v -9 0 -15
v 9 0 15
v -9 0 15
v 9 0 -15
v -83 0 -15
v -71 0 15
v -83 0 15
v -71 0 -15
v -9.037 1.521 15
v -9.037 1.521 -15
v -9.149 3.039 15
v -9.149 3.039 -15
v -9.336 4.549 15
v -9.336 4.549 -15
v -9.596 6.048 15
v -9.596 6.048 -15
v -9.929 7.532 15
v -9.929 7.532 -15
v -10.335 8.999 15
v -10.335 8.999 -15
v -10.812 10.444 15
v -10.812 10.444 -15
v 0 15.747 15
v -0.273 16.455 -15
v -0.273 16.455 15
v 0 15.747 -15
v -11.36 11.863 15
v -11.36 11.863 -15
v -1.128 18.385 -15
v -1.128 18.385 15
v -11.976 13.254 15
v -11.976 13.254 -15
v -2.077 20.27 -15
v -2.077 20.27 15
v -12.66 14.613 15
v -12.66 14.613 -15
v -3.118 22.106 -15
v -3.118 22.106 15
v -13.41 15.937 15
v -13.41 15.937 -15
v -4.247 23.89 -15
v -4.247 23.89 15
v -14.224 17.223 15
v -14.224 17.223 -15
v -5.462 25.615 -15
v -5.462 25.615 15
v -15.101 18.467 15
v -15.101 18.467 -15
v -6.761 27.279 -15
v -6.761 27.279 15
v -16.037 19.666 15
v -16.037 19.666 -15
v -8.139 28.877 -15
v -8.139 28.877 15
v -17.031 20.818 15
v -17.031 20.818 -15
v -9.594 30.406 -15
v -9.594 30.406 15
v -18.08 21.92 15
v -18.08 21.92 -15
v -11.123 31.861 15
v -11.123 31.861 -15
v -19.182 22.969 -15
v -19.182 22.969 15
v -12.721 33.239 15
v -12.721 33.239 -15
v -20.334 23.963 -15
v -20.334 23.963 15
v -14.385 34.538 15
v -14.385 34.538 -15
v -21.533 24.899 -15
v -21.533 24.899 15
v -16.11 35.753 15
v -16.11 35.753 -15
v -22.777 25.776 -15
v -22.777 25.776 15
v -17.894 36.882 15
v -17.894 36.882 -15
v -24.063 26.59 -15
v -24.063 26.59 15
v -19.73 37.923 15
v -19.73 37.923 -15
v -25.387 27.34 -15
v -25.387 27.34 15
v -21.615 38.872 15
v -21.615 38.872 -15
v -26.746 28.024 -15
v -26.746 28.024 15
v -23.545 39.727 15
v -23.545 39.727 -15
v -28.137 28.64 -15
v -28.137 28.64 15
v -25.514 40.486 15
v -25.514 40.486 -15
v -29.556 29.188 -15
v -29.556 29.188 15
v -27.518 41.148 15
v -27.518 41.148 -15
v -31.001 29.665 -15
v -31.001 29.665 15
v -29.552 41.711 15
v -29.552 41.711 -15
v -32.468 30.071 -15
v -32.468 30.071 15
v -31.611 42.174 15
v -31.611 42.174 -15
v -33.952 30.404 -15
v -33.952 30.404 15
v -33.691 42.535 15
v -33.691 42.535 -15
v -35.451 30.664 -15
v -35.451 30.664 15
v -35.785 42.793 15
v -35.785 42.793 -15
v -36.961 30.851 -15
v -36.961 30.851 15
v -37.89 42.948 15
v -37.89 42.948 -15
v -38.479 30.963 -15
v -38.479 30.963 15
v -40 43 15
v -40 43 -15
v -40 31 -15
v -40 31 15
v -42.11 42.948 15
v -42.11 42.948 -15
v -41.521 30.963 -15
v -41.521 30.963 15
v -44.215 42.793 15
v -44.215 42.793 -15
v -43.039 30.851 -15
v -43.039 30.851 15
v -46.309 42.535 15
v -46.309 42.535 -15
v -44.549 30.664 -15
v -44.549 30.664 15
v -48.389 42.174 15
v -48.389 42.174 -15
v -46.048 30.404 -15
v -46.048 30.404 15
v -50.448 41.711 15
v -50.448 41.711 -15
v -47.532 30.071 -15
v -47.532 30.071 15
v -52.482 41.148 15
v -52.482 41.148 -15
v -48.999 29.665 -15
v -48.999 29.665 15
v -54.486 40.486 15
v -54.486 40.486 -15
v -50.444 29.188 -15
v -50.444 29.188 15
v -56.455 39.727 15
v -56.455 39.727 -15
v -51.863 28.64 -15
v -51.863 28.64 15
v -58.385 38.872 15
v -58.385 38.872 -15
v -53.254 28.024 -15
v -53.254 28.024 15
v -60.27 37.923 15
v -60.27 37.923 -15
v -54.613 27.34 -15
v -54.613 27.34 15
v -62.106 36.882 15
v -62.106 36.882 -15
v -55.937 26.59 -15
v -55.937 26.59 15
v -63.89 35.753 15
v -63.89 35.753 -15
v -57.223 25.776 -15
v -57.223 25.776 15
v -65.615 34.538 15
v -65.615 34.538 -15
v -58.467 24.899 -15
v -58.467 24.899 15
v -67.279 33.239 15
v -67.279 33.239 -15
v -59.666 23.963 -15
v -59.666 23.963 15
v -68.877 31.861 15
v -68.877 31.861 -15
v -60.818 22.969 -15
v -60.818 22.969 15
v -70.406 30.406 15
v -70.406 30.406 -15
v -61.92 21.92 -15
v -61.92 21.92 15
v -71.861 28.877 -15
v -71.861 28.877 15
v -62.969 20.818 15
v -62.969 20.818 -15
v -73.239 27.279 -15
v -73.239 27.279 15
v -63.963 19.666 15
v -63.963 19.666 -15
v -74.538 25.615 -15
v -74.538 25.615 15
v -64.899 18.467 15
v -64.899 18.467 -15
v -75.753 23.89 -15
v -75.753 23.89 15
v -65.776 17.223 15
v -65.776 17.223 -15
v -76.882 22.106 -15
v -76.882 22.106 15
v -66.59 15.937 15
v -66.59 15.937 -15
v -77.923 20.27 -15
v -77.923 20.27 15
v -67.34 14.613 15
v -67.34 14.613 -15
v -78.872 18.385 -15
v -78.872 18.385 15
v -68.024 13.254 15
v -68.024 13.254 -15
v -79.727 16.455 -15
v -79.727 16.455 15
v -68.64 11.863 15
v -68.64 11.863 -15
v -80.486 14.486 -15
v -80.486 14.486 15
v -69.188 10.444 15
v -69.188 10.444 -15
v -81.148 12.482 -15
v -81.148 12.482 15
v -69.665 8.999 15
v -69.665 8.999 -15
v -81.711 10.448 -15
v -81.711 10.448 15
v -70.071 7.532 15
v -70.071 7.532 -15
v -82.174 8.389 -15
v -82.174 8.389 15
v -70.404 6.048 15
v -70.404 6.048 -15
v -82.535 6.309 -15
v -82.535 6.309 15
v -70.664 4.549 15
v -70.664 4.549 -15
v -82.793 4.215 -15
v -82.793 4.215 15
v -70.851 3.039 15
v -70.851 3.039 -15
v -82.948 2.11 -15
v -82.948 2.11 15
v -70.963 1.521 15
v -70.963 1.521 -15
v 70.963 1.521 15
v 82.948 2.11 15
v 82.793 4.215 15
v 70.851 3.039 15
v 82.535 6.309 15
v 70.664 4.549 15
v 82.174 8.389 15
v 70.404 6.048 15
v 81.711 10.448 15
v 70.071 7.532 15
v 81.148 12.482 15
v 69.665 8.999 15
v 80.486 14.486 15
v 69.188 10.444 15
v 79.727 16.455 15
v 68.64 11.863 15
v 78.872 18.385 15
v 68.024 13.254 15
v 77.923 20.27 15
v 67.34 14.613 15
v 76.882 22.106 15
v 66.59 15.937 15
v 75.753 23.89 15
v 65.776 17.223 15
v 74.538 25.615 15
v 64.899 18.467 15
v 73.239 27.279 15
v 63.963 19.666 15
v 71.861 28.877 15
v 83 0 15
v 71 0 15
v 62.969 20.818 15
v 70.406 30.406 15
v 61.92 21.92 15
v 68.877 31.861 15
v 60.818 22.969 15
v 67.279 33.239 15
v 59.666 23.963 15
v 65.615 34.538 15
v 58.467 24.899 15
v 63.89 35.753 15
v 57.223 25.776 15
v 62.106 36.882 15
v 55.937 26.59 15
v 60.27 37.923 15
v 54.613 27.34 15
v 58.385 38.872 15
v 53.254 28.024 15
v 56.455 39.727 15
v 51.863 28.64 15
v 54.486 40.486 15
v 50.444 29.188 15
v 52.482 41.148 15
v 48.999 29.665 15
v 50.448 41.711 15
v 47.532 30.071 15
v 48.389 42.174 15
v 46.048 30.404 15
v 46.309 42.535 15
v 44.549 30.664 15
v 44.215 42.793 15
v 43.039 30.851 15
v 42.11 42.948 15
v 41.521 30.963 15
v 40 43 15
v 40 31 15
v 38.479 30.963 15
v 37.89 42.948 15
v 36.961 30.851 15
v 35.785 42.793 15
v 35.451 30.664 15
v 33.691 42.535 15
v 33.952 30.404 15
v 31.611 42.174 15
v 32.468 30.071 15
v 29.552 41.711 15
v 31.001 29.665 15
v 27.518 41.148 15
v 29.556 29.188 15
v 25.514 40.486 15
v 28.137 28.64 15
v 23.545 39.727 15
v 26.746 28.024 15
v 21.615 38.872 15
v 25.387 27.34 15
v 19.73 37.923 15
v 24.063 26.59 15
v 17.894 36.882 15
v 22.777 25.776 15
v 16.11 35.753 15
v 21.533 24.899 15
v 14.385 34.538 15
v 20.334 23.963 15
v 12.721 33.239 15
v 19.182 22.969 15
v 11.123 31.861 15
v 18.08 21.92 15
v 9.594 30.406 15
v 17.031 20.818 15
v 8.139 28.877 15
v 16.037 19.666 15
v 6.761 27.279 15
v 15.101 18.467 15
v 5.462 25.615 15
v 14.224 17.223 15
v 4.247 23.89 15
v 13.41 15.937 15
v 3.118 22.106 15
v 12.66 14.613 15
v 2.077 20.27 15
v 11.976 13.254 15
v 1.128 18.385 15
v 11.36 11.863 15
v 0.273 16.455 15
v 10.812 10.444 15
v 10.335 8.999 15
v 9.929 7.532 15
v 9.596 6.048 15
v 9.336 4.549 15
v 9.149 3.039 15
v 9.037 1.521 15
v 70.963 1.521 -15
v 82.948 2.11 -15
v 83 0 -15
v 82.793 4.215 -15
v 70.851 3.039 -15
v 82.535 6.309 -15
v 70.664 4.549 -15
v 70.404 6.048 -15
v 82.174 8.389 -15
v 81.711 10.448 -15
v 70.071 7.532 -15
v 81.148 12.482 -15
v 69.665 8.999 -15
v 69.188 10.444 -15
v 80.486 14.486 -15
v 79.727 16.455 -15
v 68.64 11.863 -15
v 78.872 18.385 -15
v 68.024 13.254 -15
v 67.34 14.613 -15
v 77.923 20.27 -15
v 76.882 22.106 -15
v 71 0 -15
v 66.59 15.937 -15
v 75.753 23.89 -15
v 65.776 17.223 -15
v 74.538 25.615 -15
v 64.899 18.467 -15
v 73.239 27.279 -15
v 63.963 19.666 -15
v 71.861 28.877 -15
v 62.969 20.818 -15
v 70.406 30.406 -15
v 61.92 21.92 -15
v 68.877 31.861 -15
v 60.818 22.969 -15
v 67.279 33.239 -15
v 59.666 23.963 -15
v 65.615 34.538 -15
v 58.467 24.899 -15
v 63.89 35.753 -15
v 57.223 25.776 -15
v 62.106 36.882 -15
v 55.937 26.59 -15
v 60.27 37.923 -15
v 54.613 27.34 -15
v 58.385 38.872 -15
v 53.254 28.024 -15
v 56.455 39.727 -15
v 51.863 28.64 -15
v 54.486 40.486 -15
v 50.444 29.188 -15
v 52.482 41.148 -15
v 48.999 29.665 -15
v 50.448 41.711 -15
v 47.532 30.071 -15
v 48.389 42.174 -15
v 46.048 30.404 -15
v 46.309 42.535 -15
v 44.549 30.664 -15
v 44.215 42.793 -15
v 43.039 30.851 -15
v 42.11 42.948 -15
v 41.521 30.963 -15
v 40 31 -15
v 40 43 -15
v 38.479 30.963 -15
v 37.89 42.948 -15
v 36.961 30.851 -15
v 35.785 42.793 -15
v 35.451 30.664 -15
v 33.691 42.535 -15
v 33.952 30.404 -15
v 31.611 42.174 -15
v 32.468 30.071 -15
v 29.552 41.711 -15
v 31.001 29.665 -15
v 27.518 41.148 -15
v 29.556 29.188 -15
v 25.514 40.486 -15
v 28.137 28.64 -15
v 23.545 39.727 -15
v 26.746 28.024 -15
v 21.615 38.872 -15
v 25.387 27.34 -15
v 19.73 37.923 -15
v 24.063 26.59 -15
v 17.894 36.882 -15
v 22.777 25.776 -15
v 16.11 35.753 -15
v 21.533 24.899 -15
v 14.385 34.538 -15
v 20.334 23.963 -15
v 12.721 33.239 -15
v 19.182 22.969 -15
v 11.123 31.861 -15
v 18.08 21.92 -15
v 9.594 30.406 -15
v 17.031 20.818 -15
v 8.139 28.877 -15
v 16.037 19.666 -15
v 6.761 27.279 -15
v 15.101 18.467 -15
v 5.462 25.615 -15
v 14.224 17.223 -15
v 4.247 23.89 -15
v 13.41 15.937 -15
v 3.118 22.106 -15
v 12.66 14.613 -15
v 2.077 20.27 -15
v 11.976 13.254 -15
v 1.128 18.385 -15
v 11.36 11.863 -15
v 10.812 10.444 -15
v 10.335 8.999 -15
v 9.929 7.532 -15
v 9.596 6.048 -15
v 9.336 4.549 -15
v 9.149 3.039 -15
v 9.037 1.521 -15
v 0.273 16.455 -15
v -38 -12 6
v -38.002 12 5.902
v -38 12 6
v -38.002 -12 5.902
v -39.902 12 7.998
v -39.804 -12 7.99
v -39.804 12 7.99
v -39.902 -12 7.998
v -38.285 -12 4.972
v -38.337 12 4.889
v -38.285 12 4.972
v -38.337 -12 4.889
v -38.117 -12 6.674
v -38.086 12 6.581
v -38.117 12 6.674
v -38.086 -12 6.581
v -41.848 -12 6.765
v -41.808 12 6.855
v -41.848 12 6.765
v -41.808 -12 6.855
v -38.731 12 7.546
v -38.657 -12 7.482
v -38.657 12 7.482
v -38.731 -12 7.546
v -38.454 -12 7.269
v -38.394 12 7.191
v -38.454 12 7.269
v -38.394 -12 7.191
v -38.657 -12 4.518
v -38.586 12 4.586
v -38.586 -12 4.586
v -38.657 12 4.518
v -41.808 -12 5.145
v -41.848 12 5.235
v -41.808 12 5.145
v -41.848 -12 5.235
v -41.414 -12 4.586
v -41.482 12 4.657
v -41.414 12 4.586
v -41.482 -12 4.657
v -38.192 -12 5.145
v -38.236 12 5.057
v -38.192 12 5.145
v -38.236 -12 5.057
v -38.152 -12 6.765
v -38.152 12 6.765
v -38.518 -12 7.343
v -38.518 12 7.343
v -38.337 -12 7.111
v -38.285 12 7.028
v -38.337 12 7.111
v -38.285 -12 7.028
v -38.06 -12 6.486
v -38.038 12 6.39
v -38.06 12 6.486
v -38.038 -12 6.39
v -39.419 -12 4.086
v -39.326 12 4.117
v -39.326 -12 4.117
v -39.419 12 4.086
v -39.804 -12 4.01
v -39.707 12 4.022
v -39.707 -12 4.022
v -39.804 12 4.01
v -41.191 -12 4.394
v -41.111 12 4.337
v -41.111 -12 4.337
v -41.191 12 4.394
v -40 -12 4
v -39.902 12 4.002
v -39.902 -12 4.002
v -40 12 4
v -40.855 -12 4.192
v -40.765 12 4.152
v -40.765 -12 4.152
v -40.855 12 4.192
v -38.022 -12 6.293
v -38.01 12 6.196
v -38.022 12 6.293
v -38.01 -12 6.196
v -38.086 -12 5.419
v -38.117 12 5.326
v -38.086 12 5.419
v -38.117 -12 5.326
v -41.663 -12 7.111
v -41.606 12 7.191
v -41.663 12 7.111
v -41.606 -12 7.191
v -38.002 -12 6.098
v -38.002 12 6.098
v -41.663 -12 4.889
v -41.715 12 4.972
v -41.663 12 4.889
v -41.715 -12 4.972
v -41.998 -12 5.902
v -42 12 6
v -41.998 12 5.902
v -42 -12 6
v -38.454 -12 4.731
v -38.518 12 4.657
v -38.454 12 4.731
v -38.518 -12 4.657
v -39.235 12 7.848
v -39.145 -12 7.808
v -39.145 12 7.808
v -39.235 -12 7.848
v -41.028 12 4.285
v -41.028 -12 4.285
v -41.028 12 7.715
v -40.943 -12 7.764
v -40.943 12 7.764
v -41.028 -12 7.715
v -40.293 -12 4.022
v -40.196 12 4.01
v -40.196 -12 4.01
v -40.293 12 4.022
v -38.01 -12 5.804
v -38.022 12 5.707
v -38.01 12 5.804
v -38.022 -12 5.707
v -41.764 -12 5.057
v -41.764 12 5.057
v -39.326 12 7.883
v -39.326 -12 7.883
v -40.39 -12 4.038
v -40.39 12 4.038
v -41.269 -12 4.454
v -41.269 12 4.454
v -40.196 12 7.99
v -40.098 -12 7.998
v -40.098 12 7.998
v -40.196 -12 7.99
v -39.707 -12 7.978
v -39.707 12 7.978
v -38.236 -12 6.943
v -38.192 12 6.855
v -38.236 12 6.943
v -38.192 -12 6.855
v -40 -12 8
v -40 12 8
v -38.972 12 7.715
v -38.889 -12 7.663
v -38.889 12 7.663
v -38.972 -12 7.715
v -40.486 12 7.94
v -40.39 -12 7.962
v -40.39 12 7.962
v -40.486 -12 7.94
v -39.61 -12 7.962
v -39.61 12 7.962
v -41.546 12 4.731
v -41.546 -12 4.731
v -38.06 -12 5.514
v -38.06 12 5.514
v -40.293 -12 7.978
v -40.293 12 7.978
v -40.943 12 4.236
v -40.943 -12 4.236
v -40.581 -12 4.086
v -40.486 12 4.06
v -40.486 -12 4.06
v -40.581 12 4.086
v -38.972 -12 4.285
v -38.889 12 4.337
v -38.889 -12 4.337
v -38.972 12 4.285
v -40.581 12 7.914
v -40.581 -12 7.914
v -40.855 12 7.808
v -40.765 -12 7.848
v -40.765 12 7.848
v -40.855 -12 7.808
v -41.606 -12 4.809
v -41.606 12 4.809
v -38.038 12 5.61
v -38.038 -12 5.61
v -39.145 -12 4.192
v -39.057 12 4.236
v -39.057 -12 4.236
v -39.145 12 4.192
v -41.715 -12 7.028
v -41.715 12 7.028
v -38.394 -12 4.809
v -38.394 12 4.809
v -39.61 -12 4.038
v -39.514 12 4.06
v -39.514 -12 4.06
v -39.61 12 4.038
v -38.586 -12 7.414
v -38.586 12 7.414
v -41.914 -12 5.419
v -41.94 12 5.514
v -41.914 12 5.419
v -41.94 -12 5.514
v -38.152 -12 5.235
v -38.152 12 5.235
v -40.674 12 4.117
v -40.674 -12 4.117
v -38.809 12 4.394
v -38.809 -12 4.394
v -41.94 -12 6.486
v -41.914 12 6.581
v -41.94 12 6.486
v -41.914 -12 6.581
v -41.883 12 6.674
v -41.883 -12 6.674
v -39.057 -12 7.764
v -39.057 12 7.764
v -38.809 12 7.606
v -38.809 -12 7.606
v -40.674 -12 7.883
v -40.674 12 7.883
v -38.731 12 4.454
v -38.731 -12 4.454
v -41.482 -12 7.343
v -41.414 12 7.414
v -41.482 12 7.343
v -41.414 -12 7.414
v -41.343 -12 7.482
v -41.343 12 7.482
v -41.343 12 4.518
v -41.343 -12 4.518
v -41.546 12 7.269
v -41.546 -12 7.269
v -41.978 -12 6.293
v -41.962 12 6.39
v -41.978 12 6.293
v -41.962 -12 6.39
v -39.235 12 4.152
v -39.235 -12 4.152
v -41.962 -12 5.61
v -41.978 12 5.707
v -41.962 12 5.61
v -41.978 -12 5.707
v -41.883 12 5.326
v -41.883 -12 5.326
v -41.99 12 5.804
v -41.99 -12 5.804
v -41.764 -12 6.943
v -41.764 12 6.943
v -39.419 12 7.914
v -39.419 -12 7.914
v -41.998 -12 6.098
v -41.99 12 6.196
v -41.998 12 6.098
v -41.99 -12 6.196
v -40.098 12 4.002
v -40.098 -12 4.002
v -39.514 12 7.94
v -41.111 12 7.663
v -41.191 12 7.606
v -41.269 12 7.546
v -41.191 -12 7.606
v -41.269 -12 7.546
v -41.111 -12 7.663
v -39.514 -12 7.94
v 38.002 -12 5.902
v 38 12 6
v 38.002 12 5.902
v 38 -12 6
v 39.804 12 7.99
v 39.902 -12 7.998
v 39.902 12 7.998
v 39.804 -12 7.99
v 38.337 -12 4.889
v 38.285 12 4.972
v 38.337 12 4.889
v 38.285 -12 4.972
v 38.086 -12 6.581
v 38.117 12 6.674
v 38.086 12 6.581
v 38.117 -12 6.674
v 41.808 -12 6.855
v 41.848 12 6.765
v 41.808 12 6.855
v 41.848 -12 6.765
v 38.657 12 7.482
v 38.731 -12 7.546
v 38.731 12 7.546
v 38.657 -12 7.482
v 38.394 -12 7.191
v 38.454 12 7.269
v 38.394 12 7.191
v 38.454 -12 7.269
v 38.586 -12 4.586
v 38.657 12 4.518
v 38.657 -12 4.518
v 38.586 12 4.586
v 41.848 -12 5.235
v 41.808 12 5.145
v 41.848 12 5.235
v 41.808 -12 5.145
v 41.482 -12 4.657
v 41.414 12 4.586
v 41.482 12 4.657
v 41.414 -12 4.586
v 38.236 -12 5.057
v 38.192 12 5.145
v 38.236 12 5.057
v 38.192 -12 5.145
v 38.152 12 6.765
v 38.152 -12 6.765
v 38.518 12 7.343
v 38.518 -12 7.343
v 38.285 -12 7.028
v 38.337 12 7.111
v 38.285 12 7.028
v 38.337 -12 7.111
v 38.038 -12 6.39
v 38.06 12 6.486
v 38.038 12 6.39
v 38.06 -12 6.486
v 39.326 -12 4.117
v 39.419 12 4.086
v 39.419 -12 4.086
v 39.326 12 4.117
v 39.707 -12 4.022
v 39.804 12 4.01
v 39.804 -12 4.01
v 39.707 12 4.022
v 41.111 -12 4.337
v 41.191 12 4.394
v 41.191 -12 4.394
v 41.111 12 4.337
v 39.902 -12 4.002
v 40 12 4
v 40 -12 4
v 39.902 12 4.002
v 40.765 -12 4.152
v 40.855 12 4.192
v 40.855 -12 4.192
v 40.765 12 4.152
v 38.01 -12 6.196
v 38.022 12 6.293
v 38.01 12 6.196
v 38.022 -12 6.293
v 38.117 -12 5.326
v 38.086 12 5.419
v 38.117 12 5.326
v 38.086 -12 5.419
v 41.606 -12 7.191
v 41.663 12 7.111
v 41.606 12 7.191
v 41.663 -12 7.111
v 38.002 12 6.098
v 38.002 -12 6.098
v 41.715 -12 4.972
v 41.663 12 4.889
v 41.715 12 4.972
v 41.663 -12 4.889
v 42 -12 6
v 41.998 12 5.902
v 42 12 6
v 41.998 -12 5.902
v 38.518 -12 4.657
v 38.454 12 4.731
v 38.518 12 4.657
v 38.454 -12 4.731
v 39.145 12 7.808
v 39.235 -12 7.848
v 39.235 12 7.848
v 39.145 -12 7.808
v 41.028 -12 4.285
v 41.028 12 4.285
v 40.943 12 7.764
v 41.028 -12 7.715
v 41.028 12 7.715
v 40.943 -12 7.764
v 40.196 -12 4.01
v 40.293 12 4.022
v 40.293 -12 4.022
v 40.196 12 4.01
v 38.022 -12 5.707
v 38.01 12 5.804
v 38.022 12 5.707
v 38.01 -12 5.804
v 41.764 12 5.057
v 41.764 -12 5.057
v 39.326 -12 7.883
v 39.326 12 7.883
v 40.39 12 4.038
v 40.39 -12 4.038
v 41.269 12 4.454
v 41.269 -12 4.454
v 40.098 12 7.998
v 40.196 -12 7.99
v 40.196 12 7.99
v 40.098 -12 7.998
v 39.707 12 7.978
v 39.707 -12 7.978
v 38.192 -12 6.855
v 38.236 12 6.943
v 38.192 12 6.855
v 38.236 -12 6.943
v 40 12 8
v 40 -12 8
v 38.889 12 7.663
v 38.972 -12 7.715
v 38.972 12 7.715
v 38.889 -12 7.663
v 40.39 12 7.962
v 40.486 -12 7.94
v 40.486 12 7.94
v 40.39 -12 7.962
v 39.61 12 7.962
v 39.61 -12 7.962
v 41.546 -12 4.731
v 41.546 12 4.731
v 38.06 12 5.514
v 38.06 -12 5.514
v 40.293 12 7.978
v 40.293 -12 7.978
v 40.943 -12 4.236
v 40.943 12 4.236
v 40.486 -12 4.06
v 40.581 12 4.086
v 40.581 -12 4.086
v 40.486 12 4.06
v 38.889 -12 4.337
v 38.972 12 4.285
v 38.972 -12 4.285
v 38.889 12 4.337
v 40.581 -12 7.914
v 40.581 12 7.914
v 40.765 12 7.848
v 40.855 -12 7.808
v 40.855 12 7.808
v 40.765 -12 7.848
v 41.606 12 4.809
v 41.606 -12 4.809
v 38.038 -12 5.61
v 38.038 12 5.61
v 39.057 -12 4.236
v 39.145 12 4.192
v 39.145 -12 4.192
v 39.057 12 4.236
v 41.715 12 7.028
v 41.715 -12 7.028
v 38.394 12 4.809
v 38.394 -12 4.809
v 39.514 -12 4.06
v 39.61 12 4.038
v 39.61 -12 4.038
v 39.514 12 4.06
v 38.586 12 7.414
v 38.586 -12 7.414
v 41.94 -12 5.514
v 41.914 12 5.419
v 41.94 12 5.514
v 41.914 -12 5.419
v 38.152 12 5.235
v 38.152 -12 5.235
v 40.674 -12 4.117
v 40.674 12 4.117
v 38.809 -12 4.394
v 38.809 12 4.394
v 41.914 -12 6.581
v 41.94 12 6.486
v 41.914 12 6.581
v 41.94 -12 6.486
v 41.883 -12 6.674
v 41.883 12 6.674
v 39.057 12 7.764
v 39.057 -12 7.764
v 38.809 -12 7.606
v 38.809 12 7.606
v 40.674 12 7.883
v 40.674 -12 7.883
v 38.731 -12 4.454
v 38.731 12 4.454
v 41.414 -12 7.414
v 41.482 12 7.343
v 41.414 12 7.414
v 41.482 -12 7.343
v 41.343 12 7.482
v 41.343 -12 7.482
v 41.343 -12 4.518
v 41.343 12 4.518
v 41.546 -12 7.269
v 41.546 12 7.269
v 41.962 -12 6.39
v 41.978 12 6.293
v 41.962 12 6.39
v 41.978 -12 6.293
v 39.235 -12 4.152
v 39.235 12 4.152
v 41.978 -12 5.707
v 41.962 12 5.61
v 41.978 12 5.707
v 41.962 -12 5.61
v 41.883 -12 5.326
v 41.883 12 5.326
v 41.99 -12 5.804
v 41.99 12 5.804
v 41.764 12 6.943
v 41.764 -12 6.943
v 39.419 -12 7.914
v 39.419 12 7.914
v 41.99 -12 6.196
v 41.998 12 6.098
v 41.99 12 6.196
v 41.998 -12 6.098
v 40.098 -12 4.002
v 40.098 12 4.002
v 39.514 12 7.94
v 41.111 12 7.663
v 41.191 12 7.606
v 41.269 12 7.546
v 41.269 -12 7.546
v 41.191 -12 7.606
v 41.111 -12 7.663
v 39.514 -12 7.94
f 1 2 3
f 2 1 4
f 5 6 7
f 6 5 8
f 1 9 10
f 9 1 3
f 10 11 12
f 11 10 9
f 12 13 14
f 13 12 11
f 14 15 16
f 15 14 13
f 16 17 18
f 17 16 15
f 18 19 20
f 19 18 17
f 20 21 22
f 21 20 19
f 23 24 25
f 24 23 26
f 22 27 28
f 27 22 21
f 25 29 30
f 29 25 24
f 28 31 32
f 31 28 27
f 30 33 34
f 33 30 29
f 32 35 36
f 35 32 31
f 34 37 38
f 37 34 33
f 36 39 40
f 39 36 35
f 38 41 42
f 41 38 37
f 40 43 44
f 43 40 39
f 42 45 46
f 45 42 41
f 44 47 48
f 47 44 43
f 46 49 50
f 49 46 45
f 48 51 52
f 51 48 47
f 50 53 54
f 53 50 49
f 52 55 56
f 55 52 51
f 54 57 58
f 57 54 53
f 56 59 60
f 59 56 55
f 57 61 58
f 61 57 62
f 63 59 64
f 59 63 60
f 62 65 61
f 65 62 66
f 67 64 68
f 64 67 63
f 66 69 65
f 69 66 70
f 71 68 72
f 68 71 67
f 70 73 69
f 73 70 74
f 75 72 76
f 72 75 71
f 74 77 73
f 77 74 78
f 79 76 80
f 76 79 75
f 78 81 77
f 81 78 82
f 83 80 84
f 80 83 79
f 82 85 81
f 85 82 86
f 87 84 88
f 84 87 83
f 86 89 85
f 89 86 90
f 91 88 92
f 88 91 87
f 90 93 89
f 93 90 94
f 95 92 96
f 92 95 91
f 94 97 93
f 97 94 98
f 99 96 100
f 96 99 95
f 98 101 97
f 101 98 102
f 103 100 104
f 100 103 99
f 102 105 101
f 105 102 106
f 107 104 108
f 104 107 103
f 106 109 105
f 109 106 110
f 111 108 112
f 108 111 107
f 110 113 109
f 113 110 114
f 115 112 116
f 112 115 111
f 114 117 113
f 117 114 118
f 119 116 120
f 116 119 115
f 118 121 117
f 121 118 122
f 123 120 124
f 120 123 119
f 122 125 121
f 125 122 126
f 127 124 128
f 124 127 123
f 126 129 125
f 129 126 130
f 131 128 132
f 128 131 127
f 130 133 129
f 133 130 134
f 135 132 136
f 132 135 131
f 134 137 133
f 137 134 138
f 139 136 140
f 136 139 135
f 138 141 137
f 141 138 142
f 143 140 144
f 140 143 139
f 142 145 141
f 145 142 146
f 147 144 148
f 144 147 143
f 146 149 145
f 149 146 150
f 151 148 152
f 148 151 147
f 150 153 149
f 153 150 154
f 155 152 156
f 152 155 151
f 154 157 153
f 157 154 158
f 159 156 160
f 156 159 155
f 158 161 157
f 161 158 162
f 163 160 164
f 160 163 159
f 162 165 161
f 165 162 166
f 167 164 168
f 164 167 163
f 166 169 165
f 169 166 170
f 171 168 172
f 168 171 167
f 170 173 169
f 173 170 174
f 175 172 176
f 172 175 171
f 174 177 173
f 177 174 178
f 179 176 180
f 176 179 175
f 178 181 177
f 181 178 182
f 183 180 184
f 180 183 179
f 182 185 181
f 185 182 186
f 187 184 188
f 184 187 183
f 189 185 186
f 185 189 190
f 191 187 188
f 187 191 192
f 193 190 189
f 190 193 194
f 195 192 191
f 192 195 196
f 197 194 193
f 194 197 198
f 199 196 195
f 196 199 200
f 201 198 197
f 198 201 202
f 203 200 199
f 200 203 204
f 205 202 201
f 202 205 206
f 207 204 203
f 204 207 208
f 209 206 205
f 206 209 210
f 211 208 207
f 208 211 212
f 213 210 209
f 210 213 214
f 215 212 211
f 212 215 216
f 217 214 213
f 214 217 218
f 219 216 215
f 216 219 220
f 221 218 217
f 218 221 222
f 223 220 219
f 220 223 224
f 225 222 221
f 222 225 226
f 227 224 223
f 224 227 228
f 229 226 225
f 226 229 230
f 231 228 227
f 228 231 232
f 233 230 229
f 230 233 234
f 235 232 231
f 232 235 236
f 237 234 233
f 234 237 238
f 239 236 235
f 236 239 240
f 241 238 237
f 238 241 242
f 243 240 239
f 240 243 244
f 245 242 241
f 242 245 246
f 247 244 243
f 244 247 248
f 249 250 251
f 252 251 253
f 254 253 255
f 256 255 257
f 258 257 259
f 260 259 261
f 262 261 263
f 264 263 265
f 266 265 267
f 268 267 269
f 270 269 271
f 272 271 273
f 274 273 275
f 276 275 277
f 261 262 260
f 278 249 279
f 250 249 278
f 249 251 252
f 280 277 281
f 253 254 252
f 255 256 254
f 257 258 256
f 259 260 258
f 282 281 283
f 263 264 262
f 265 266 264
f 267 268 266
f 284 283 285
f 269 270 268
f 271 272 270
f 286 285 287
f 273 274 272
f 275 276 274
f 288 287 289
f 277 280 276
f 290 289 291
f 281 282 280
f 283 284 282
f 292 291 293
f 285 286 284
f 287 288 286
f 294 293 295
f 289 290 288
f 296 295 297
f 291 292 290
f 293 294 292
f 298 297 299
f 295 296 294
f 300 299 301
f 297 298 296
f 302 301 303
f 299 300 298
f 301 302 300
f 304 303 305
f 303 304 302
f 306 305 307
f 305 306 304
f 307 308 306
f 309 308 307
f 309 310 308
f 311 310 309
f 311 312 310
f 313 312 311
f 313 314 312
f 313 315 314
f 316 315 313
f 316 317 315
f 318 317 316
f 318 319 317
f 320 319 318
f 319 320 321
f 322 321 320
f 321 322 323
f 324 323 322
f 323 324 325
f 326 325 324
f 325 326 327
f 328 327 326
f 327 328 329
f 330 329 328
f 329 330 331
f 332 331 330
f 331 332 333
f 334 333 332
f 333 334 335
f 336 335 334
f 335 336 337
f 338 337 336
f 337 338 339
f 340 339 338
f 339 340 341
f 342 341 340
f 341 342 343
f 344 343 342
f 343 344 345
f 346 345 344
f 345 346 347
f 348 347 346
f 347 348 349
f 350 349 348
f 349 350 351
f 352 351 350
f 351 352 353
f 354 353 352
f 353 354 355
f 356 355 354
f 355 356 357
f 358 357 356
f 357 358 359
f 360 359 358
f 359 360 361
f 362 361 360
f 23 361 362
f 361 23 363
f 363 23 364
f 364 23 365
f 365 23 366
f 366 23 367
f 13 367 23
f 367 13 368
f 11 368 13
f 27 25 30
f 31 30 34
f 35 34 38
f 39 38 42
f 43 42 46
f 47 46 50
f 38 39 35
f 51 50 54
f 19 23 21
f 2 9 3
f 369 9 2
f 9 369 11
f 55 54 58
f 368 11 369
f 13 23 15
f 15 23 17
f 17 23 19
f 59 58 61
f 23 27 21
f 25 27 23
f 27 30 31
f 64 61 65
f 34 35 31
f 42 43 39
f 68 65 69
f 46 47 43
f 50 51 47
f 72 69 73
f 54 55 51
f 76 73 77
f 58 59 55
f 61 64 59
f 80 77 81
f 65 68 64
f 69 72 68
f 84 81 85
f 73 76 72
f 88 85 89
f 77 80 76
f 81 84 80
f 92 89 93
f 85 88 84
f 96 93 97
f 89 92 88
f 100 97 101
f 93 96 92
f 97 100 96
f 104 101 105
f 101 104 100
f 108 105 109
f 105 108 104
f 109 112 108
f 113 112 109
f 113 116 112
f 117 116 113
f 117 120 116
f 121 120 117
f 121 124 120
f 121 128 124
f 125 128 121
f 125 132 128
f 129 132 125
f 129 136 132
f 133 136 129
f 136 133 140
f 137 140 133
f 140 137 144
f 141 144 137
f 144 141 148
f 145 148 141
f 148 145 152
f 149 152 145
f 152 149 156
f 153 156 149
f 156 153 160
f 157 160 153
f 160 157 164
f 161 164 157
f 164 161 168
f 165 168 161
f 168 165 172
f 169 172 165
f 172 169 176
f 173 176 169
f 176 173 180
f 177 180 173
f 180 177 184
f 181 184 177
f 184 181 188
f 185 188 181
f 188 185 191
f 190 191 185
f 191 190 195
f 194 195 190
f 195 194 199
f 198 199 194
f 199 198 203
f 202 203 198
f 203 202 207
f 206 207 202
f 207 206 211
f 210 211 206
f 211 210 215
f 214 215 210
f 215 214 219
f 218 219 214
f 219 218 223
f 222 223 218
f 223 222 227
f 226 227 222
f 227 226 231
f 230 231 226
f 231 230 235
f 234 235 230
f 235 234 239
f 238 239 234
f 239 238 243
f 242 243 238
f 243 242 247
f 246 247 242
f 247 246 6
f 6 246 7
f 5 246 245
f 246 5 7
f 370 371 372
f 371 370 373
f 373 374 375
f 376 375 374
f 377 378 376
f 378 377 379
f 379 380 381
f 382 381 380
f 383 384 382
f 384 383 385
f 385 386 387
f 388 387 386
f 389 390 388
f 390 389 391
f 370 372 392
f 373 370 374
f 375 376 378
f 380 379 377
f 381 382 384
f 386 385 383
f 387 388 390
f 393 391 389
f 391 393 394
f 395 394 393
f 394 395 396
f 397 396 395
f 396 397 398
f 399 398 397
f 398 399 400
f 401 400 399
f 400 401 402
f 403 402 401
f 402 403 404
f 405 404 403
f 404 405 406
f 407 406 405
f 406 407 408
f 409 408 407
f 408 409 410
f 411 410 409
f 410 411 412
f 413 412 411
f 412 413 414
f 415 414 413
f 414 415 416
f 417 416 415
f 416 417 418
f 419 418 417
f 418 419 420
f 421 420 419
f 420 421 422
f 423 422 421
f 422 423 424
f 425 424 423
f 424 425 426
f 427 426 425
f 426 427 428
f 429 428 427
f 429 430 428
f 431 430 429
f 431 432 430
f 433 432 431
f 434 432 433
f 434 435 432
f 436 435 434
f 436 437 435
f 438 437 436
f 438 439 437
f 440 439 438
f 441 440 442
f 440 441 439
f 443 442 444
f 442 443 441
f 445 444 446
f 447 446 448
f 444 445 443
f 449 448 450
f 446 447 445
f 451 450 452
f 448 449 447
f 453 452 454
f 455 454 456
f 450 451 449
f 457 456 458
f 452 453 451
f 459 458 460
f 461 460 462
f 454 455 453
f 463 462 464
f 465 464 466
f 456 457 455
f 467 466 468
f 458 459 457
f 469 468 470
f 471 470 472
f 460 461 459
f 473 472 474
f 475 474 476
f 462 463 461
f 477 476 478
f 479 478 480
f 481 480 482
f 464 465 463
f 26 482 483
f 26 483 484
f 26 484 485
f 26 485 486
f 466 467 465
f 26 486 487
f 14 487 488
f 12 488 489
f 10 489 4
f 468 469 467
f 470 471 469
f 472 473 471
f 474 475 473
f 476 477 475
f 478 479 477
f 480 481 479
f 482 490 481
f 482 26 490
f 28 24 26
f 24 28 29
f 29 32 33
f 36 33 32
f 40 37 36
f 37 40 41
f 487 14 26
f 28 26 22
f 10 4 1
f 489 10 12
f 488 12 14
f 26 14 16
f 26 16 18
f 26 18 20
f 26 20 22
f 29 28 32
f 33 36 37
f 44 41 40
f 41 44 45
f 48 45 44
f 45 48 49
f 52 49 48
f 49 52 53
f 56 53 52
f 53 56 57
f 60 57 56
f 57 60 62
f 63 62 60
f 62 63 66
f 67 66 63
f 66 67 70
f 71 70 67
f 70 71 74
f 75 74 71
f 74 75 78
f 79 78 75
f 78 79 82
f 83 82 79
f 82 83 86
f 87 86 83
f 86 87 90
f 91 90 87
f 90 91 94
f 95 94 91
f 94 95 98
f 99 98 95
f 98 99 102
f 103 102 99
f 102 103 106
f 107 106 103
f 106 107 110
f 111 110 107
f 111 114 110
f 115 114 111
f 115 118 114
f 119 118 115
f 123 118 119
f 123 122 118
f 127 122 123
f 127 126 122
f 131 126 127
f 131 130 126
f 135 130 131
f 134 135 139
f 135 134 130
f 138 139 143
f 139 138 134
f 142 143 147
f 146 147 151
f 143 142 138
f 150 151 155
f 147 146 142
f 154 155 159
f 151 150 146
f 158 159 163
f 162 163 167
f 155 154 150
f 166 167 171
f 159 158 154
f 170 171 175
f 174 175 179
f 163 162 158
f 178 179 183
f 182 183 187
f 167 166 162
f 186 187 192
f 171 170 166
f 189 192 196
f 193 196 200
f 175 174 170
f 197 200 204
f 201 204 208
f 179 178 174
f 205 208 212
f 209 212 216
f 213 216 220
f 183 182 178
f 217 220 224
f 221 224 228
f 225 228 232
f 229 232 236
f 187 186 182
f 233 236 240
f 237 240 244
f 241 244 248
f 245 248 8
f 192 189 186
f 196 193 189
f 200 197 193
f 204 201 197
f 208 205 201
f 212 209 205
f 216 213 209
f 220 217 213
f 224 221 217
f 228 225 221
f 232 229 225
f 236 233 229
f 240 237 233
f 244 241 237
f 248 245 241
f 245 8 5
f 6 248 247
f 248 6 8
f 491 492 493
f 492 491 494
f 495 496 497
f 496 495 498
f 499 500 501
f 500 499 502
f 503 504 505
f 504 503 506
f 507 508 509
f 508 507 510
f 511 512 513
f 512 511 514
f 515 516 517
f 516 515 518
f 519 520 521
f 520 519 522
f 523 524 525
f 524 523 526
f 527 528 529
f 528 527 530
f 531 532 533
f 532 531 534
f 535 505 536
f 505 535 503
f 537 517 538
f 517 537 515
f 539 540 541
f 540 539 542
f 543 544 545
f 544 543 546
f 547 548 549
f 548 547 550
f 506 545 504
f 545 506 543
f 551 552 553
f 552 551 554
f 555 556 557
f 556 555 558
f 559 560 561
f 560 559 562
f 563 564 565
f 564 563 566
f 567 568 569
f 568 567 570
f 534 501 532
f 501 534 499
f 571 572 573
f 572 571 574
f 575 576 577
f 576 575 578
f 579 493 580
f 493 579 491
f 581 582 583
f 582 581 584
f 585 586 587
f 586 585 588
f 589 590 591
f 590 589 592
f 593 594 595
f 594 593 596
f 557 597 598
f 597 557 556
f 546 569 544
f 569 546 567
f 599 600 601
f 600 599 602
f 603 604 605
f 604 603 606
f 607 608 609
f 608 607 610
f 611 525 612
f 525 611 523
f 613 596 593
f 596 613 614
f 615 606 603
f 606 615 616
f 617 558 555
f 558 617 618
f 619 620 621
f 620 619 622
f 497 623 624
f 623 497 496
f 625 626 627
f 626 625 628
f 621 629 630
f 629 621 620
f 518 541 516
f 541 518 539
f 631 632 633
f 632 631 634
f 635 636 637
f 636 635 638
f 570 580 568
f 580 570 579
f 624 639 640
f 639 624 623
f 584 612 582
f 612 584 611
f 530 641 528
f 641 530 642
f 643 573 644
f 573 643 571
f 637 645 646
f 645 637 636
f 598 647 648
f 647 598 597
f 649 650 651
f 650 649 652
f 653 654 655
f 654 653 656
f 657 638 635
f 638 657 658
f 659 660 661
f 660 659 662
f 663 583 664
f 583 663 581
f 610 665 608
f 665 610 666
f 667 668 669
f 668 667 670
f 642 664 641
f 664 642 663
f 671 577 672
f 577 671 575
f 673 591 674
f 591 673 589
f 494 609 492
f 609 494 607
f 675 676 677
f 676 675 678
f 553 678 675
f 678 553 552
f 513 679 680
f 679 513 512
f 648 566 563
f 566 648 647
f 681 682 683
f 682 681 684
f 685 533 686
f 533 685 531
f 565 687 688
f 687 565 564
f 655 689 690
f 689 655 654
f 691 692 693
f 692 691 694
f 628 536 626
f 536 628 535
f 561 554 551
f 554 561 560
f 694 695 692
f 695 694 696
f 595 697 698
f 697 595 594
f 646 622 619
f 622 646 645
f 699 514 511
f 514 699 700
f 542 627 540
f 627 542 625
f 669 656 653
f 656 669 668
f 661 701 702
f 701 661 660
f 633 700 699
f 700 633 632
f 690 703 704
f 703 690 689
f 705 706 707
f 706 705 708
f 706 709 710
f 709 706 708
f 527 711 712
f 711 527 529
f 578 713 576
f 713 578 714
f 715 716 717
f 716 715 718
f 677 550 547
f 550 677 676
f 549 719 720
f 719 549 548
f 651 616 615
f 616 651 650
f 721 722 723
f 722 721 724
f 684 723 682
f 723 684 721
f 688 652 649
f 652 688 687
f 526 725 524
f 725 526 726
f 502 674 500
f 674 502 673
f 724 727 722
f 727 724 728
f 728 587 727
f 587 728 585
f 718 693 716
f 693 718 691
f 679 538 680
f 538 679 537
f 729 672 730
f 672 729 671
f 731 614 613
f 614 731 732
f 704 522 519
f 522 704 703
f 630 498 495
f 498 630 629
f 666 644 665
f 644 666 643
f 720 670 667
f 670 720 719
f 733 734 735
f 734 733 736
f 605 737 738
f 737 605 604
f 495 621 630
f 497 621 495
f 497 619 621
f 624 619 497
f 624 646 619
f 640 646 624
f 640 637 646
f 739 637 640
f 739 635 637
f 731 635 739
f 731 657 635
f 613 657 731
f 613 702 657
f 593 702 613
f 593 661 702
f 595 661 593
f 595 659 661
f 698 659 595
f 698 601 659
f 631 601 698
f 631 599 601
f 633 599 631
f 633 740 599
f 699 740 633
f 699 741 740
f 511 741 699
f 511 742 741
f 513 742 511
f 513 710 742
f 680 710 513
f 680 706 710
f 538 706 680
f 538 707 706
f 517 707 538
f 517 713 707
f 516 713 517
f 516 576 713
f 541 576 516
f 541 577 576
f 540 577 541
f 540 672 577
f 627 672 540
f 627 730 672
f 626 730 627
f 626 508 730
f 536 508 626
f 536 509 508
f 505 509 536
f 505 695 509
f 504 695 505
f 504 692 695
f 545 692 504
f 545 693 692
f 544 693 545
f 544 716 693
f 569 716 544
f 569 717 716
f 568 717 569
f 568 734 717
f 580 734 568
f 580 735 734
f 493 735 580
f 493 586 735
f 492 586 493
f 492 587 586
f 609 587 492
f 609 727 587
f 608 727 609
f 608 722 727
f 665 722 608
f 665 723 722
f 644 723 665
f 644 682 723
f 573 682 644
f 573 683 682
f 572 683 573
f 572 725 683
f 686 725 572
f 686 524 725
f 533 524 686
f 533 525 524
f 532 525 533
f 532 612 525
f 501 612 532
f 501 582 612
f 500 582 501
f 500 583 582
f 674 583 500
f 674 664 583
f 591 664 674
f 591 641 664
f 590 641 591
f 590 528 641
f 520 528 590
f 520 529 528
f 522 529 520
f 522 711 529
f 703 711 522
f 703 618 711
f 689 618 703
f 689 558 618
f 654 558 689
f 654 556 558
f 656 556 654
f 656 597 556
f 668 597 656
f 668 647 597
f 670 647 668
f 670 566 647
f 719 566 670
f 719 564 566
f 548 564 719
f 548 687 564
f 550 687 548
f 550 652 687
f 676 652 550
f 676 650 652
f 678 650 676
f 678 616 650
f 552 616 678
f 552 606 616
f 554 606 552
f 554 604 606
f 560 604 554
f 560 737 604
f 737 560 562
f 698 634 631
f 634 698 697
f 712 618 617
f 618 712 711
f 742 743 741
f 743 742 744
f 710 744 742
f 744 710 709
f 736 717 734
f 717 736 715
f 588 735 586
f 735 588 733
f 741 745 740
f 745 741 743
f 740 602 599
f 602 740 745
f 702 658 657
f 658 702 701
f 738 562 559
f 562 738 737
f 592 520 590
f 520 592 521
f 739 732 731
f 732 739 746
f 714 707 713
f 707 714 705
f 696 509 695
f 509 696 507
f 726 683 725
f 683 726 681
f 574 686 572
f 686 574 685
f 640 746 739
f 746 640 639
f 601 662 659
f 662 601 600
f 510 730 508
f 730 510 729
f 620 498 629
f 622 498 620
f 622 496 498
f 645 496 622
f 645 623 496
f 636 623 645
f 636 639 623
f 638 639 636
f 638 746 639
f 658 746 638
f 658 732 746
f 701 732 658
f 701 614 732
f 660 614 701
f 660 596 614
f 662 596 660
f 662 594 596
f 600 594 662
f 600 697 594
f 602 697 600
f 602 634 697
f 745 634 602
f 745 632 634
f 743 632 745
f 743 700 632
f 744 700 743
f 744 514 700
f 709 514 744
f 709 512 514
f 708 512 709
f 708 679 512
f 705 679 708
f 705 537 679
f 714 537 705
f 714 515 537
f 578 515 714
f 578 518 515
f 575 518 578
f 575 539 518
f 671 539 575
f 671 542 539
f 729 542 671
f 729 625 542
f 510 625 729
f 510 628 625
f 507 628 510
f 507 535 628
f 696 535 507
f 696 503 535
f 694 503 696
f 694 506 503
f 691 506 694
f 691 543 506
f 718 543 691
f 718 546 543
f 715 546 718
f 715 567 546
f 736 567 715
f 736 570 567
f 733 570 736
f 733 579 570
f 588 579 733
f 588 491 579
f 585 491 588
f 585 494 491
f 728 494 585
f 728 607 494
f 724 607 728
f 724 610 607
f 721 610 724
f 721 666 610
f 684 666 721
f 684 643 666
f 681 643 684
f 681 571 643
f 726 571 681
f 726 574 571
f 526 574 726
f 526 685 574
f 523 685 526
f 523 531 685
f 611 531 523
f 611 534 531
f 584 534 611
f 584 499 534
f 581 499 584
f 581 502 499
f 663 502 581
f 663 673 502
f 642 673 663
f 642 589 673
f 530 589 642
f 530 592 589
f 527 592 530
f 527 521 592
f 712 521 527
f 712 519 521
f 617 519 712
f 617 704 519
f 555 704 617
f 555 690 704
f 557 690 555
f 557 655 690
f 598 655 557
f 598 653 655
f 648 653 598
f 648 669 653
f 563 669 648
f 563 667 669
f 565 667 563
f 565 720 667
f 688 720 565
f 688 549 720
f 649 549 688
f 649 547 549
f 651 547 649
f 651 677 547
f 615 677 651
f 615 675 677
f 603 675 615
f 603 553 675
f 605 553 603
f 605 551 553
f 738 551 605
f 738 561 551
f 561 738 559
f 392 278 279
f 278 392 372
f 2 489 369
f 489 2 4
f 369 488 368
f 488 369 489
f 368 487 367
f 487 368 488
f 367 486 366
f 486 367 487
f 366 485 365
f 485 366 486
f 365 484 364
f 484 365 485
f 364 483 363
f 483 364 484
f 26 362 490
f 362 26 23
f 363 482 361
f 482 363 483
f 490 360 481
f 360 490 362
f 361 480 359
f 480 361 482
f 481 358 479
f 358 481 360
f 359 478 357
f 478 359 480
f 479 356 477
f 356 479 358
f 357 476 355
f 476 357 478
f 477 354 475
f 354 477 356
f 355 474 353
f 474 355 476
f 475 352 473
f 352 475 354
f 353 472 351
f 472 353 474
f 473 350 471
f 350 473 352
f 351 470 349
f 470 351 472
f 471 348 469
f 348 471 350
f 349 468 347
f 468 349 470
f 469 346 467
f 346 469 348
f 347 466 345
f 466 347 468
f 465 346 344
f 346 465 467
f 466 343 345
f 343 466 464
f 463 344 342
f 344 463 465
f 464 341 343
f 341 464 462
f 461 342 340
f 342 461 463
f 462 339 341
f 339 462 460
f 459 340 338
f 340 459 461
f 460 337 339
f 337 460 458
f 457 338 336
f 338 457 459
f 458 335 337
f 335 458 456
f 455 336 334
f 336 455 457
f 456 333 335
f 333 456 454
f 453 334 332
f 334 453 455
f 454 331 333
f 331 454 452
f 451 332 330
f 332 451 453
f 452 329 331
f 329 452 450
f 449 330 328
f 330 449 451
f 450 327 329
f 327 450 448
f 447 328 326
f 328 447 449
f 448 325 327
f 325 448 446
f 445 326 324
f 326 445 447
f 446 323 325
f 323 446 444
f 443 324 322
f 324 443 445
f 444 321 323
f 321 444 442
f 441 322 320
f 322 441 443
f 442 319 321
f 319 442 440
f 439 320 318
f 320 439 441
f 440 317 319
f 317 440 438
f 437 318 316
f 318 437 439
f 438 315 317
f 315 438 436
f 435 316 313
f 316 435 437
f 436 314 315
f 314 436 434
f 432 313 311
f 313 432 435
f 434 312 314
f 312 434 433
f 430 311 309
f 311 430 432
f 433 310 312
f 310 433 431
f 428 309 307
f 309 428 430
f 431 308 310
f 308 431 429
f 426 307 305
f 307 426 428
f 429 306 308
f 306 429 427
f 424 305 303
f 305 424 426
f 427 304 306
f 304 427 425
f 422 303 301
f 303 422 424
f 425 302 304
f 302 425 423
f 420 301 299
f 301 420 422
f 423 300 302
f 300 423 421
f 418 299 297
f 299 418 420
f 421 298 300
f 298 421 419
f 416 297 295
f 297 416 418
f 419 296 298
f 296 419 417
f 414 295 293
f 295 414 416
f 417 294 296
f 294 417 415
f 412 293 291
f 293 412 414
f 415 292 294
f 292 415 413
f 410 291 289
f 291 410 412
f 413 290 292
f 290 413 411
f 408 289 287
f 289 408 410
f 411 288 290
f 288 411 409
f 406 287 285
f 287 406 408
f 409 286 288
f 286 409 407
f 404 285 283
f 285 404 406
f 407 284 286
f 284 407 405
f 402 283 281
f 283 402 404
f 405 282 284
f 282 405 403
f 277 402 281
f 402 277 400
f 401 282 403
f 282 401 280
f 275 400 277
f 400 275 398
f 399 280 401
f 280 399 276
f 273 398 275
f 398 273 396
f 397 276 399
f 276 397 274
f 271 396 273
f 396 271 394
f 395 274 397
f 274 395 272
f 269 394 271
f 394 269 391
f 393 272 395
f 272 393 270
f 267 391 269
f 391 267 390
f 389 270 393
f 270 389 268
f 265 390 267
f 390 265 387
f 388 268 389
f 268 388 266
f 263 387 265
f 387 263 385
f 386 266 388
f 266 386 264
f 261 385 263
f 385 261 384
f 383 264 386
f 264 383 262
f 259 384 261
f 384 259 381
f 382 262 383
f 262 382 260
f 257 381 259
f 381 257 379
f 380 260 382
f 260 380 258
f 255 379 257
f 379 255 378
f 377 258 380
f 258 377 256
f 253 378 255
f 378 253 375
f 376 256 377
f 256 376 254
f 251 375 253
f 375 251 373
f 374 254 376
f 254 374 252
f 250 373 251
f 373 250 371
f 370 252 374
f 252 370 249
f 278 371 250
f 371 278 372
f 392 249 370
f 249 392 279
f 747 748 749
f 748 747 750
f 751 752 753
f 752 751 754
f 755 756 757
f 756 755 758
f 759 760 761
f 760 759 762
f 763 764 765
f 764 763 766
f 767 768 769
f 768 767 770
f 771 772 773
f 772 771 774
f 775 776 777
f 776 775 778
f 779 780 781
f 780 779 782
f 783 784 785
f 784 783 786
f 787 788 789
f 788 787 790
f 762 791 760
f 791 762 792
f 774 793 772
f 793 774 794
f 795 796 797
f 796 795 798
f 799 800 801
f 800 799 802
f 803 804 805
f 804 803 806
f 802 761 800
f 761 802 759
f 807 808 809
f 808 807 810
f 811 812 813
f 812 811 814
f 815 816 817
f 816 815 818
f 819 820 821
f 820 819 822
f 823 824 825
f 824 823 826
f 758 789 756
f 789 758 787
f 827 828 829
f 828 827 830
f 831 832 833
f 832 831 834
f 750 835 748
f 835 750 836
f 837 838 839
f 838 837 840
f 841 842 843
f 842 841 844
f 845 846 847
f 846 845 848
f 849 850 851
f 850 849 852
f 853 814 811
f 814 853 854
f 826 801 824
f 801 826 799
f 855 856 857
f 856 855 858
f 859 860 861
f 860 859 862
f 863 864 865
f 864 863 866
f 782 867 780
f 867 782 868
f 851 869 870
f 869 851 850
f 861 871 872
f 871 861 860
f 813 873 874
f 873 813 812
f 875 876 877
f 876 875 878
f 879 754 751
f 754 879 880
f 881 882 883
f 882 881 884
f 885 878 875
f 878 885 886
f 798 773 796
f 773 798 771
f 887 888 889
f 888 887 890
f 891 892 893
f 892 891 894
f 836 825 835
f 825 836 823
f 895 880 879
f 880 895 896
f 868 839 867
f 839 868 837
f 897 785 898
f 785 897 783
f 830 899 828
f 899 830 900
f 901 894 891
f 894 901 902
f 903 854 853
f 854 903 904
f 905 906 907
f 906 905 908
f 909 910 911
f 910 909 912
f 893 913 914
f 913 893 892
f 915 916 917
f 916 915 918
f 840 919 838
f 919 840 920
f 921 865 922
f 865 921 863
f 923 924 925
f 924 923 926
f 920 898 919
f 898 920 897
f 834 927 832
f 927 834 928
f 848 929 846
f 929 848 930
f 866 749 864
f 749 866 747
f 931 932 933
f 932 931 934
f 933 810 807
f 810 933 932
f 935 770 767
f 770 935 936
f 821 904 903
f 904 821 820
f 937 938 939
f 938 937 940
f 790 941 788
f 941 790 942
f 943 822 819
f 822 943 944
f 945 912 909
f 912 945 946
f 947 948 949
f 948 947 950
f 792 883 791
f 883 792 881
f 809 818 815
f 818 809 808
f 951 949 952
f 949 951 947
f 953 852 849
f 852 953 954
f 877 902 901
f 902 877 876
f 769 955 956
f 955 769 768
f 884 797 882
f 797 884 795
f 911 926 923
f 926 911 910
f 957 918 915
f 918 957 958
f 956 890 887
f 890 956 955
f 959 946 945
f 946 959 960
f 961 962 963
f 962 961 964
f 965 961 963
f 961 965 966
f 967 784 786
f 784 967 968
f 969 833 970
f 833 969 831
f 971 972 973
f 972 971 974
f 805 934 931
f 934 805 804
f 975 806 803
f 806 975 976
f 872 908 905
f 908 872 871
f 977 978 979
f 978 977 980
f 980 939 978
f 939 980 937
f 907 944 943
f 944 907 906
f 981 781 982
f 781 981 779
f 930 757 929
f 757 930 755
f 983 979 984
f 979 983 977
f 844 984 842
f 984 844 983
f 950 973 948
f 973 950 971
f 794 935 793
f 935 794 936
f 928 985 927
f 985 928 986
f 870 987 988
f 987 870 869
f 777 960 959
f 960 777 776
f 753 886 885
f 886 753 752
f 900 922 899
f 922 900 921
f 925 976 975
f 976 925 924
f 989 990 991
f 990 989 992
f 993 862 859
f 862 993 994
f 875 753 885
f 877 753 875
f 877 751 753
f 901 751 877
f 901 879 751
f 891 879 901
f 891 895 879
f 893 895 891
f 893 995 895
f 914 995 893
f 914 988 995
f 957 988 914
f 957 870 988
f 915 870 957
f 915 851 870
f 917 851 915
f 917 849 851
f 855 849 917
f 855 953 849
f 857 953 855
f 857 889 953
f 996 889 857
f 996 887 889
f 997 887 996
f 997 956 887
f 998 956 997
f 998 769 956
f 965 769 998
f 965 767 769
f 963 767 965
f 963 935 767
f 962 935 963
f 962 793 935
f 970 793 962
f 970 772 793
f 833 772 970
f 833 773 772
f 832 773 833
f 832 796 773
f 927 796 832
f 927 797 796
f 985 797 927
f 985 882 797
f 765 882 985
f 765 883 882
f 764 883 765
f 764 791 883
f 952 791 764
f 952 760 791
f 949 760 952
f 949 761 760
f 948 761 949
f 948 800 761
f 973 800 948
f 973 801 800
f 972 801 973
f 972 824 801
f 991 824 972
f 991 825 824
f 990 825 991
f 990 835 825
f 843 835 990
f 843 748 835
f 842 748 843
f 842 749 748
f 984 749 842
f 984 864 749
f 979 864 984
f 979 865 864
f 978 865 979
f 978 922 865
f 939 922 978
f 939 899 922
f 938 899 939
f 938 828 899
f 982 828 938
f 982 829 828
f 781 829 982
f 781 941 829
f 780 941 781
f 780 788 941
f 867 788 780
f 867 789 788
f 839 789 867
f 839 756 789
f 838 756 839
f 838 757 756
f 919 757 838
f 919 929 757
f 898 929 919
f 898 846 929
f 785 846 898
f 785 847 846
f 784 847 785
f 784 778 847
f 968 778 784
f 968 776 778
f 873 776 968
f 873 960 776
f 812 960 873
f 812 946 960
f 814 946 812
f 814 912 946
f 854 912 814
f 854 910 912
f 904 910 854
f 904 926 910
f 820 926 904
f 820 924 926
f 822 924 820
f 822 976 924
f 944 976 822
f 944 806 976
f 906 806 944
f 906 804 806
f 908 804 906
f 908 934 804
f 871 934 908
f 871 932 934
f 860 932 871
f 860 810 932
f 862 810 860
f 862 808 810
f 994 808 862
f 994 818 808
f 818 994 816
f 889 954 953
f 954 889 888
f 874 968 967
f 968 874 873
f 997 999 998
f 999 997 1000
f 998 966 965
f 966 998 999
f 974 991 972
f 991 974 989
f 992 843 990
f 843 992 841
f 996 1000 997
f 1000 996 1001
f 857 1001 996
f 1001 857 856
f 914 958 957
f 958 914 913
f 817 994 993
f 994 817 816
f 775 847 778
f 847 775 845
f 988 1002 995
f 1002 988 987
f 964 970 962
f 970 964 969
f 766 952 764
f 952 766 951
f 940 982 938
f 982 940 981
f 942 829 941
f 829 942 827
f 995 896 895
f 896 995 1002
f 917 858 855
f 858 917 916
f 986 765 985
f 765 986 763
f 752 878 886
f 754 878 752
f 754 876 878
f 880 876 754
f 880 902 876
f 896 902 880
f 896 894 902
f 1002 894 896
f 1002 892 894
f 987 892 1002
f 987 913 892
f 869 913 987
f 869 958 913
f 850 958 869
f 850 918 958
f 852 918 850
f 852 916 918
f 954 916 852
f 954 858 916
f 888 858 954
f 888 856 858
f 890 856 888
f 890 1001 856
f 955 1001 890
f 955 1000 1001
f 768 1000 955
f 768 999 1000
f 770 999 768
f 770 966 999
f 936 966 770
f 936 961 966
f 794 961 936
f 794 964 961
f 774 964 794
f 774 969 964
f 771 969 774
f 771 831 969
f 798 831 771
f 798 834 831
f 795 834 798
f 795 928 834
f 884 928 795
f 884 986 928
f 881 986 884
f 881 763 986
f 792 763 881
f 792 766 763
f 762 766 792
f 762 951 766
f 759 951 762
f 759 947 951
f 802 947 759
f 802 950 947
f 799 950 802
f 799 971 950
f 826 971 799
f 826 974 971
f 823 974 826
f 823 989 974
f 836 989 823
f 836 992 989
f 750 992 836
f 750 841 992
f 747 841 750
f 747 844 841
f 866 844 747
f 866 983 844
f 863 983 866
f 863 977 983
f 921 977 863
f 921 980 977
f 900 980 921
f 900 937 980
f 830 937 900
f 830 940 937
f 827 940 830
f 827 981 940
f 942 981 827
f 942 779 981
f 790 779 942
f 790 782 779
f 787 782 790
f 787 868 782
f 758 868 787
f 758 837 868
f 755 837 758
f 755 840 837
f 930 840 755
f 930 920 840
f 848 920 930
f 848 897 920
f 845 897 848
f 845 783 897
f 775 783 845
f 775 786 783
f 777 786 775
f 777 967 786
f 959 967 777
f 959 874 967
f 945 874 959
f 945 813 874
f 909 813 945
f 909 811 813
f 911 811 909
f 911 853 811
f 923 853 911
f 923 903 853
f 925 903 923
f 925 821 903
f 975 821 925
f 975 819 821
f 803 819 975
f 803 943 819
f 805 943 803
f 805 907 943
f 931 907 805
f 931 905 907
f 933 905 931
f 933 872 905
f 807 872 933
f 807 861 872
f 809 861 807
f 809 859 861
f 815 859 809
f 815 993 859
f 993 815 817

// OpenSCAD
// half_clamp.scad
// 半弧夹具（配合 mandrel 使用）
// 参数：inner_diameter（匹配 mandrel）、arc_angle（半弧角度）、厚度、螺栓孔位置

$fn = 128;

module half_clamp(inner_diameter=50, arc_angle=180, thickness=10, width=30, hole_d=4, bolt_offset=10) {
  r = inner_diameter/2;
  // 基本半圆壳体
  difference() {
    // 外形：扇形柱
    rotate_extrude(angle=arc_angle)
      translate([r + thickness,0,0]) square([thickness, width], center=true);
    // 内腔：去除与 mandrel 配合的半圆
    translate([0,0,-1])
      rotate_extrude(angle=arc_angle)
        translate([r - 0.1,0,0]) square([0.2, width+2], center=true);
  }

  // 螺栓孔（两个）
  translate([0, (width/2 - bolt_offset), thickness/2])
    rotate([90,0,0])
      translate([0,0,0])
        cylinder(h=thickness+2, r=hole_d/2, center=true);
  translate([0, -(width/2 - bolt_offset), thickness/2])
    rotate([90,0,0])
      cylinder(h=thickness+2, r=hole_d/2, center=true);
}

// 输出示���：一对对称半夹具
translate([-40,0,0]) half_clamp(inner_diameter=50, arc_angle=180, thickness=12, width=30);
translate([40,0,0]) mirror([1,0,0]) half_clamp(inner_diameter=50, arc_angle=180, thickness=12, width=30);
